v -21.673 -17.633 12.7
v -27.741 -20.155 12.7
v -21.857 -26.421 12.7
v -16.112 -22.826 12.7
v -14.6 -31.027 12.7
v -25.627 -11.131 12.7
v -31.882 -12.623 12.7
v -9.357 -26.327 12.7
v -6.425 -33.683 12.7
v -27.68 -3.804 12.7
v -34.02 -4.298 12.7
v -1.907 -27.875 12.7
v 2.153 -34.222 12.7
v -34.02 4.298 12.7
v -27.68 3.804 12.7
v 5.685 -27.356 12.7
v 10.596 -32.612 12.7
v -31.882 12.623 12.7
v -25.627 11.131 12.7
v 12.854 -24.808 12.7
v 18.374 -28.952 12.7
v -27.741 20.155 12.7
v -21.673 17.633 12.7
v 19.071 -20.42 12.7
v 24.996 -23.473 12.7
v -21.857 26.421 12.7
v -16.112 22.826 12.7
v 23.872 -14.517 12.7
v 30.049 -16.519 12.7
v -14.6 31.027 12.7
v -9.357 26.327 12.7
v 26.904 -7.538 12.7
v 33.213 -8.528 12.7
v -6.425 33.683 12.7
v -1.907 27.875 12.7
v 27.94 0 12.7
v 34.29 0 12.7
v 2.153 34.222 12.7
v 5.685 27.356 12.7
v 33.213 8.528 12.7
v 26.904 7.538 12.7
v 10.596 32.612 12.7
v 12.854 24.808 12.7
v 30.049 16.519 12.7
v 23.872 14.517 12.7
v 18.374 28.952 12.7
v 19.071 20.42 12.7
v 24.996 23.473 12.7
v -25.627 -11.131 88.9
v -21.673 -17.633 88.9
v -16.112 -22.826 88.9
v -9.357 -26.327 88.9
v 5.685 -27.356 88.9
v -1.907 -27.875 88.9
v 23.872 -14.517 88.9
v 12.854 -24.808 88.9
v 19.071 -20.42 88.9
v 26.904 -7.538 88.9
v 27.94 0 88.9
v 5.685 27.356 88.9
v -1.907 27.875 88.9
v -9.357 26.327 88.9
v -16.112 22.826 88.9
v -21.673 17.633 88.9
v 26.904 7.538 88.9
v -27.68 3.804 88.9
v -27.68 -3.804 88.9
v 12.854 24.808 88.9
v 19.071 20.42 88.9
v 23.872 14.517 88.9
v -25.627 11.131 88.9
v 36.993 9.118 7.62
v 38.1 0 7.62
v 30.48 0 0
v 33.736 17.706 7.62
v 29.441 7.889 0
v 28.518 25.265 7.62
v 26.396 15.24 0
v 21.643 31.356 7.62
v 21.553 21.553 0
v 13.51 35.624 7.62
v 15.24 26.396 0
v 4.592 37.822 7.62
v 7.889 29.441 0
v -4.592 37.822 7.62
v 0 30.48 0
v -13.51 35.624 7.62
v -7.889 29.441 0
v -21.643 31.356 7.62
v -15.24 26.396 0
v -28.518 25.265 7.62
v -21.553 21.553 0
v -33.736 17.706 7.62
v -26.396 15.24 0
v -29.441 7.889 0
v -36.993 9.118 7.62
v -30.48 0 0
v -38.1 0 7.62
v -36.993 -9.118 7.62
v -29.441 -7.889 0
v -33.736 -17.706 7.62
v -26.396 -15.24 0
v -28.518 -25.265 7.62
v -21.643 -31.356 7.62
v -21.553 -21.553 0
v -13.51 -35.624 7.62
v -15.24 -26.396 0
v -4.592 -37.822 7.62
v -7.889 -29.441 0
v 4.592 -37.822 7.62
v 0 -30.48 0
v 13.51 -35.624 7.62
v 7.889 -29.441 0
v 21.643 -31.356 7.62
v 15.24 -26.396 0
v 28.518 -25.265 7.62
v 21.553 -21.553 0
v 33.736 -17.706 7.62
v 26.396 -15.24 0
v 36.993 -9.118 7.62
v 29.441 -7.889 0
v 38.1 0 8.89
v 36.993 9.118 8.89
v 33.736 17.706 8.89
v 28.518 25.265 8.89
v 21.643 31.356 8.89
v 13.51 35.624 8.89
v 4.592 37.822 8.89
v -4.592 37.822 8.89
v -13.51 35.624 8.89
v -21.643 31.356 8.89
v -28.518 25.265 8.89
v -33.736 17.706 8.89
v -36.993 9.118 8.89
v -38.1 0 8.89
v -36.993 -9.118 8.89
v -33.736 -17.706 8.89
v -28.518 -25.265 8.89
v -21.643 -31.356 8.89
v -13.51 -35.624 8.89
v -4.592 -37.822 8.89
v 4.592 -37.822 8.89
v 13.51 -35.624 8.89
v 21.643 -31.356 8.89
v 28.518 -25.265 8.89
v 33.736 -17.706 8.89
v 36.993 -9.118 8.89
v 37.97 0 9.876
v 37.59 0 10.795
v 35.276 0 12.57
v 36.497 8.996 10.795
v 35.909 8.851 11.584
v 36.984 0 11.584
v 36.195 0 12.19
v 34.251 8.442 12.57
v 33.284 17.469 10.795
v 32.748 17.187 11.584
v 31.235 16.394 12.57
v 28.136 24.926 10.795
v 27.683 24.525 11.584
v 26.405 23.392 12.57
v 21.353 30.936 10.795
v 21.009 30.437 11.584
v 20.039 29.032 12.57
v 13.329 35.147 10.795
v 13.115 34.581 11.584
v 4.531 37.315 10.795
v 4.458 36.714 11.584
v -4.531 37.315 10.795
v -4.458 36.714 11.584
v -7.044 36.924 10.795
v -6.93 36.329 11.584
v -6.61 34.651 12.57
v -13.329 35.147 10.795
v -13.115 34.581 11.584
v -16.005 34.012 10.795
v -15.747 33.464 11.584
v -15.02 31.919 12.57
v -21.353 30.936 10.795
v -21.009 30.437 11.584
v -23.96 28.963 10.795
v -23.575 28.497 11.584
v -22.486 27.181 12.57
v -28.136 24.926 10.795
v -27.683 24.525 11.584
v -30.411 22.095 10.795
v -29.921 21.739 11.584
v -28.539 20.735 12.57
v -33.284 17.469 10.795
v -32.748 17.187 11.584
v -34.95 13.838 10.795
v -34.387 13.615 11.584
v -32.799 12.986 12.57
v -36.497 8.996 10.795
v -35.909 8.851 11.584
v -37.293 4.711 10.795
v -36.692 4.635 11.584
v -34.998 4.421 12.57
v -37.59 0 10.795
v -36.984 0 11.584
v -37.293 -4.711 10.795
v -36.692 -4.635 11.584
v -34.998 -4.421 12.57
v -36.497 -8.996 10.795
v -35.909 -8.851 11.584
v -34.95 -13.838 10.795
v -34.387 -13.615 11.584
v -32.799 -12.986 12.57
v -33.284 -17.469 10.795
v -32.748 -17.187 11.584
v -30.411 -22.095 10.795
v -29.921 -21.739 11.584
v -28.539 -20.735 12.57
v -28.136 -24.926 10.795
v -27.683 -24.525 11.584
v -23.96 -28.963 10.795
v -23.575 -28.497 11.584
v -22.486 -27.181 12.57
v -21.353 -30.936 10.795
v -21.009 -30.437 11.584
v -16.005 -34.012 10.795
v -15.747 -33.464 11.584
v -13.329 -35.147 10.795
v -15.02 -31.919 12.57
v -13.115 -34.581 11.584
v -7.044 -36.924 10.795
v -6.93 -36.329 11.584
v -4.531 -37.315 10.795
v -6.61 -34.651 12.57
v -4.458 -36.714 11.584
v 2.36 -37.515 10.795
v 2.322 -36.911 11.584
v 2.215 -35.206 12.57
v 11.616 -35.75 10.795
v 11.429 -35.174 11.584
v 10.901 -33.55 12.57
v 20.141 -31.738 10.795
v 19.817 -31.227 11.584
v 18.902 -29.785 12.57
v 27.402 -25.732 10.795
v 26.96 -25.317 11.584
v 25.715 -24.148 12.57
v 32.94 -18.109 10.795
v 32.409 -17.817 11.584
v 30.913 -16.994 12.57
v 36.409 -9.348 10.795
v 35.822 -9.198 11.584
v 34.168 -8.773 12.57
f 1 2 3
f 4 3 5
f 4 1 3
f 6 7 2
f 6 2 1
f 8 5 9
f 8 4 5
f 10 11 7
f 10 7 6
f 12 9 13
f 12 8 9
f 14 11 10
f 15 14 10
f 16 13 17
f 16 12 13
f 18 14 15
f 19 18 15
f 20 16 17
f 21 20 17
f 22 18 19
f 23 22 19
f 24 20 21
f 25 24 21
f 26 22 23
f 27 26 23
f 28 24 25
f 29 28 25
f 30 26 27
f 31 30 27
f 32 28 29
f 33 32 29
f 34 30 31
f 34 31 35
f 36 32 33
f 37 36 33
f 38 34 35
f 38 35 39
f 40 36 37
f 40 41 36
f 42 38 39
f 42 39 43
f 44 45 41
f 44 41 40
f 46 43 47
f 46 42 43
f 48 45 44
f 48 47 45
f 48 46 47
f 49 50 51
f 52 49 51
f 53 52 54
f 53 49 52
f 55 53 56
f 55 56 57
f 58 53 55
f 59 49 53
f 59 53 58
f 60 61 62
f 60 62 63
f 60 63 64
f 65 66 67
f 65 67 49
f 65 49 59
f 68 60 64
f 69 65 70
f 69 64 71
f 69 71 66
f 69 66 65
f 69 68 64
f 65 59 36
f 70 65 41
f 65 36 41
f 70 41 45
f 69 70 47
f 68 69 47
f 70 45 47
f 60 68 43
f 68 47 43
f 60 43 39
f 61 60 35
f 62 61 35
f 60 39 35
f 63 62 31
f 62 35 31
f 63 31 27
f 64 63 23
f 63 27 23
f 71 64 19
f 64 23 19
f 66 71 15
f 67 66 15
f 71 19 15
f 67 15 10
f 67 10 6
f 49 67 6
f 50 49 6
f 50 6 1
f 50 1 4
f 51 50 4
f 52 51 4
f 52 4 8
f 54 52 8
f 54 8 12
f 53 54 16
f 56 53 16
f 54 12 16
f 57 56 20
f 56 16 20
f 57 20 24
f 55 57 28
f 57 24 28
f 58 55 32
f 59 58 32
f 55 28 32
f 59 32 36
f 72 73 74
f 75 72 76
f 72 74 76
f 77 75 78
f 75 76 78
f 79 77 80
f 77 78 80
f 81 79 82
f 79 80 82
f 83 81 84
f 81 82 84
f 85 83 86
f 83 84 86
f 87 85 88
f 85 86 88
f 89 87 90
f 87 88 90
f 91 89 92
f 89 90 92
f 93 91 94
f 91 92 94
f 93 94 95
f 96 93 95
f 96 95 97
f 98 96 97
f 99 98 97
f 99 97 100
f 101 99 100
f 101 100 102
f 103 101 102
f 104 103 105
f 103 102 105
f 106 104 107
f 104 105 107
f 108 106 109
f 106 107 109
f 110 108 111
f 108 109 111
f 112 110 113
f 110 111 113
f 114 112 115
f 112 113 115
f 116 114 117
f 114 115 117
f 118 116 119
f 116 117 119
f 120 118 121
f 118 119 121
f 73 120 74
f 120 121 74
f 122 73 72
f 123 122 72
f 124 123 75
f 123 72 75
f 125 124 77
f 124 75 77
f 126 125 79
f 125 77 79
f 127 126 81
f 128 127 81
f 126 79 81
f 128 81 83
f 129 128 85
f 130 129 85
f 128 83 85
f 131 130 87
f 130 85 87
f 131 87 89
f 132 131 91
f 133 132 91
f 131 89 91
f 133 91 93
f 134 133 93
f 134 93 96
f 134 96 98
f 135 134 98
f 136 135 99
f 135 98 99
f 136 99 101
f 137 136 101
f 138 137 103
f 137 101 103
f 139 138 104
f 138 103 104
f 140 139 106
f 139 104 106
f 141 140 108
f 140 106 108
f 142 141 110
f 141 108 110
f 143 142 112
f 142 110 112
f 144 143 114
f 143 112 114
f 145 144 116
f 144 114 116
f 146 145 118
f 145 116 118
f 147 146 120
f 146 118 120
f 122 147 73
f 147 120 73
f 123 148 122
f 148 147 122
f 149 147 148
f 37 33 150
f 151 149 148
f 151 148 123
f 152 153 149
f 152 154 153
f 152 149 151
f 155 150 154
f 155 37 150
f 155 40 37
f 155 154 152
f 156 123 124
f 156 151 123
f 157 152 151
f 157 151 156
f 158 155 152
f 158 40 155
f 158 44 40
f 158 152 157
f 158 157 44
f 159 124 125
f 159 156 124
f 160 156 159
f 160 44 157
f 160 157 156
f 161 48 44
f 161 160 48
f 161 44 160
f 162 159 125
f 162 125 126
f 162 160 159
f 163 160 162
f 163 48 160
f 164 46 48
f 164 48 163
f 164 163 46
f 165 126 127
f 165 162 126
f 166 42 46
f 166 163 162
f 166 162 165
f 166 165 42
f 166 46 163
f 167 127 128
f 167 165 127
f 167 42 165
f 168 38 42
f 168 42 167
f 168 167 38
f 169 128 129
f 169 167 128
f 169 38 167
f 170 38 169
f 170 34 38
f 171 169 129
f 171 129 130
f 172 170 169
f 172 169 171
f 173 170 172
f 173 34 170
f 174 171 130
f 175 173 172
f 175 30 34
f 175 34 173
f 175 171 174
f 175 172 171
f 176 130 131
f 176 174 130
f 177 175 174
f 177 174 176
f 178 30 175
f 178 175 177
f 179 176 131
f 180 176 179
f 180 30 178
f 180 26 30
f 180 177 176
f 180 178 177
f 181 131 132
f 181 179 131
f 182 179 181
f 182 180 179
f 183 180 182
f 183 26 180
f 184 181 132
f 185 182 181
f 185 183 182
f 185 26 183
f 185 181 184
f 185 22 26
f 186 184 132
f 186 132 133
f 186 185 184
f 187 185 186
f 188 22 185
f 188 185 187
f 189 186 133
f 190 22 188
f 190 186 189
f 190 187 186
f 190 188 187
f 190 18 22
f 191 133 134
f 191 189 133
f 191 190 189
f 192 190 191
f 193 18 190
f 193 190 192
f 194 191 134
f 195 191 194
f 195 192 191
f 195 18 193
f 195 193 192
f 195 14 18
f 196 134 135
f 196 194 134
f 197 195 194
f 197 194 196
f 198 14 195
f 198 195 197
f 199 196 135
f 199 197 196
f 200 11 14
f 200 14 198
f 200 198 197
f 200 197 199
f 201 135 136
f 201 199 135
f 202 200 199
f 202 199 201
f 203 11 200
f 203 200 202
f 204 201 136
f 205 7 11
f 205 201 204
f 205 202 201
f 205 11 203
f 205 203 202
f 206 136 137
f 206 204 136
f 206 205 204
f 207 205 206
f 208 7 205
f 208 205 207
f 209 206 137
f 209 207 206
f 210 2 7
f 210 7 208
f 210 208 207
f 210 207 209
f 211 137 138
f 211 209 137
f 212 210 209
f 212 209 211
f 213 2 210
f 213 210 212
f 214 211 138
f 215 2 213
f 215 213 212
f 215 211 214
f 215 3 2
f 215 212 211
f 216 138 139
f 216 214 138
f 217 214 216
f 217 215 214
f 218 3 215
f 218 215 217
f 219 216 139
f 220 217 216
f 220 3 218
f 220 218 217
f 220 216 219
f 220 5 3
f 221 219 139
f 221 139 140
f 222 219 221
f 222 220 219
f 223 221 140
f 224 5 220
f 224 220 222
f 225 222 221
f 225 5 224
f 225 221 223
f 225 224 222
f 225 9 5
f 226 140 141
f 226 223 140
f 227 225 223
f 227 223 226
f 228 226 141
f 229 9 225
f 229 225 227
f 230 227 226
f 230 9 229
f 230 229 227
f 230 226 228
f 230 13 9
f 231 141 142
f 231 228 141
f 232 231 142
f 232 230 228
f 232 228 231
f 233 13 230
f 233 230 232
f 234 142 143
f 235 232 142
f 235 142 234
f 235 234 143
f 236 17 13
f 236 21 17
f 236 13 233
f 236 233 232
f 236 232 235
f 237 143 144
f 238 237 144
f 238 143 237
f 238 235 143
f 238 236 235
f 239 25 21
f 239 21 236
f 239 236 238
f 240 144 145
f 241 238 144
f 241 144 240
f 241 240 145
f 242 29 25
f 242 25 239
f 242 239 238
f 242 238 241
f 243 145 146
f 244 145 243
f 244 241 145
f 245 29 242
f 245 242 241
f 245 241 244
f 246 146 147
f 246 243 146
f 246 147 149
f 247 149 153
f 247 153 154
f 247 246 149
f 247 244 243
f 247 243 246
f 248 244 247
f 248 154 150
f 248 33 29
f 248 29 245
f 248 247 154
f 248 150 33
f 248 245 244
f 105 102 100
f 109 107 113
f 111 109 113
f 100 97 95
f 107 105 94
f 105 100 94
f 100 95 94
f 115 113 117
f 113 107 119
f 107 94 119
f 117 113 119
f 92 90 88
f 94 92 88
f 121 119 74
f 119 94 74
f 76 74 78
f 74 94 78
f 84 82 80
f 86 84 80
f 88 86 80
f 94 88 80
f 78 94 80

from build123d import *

# Parameters (mm, degrees)
F0_R     = 38.1
F1_DEPTH = 12.7
F2_R     = 3.81
F3_SIZE  = 7.62
F4_R     = 27.94
F5_DEPTH = 76.2


with BuildPart() as f1:
    # F0 (on Top) → F1 (new body)
    with BuildSketch(Plane.XY):
        Circle(F0_R)
    extrude(amount=F1_DEPTH)

    # F2
    f2_edges = [f1.edges().sort_by_distance(p)[0] for p in [
        (-38.1, 0, 12.7),
    ]]
    fillet(f2_edges, radius=F2_R)

    # F3
    f3_edges = [f1.edges().sort_by_distance(p)[0] for p in [
        (-38.1, 0, 0),
    ]]
    chamfer(f3_edges, length=F3_SIZE)

    # F4 (on face) → F5 (join)
    with BuildSketch(Plane.XY.offset(12.7)):
        Circle(F4_R)
    extrude(amount=F5_DEPTH)


solid = f1.part
